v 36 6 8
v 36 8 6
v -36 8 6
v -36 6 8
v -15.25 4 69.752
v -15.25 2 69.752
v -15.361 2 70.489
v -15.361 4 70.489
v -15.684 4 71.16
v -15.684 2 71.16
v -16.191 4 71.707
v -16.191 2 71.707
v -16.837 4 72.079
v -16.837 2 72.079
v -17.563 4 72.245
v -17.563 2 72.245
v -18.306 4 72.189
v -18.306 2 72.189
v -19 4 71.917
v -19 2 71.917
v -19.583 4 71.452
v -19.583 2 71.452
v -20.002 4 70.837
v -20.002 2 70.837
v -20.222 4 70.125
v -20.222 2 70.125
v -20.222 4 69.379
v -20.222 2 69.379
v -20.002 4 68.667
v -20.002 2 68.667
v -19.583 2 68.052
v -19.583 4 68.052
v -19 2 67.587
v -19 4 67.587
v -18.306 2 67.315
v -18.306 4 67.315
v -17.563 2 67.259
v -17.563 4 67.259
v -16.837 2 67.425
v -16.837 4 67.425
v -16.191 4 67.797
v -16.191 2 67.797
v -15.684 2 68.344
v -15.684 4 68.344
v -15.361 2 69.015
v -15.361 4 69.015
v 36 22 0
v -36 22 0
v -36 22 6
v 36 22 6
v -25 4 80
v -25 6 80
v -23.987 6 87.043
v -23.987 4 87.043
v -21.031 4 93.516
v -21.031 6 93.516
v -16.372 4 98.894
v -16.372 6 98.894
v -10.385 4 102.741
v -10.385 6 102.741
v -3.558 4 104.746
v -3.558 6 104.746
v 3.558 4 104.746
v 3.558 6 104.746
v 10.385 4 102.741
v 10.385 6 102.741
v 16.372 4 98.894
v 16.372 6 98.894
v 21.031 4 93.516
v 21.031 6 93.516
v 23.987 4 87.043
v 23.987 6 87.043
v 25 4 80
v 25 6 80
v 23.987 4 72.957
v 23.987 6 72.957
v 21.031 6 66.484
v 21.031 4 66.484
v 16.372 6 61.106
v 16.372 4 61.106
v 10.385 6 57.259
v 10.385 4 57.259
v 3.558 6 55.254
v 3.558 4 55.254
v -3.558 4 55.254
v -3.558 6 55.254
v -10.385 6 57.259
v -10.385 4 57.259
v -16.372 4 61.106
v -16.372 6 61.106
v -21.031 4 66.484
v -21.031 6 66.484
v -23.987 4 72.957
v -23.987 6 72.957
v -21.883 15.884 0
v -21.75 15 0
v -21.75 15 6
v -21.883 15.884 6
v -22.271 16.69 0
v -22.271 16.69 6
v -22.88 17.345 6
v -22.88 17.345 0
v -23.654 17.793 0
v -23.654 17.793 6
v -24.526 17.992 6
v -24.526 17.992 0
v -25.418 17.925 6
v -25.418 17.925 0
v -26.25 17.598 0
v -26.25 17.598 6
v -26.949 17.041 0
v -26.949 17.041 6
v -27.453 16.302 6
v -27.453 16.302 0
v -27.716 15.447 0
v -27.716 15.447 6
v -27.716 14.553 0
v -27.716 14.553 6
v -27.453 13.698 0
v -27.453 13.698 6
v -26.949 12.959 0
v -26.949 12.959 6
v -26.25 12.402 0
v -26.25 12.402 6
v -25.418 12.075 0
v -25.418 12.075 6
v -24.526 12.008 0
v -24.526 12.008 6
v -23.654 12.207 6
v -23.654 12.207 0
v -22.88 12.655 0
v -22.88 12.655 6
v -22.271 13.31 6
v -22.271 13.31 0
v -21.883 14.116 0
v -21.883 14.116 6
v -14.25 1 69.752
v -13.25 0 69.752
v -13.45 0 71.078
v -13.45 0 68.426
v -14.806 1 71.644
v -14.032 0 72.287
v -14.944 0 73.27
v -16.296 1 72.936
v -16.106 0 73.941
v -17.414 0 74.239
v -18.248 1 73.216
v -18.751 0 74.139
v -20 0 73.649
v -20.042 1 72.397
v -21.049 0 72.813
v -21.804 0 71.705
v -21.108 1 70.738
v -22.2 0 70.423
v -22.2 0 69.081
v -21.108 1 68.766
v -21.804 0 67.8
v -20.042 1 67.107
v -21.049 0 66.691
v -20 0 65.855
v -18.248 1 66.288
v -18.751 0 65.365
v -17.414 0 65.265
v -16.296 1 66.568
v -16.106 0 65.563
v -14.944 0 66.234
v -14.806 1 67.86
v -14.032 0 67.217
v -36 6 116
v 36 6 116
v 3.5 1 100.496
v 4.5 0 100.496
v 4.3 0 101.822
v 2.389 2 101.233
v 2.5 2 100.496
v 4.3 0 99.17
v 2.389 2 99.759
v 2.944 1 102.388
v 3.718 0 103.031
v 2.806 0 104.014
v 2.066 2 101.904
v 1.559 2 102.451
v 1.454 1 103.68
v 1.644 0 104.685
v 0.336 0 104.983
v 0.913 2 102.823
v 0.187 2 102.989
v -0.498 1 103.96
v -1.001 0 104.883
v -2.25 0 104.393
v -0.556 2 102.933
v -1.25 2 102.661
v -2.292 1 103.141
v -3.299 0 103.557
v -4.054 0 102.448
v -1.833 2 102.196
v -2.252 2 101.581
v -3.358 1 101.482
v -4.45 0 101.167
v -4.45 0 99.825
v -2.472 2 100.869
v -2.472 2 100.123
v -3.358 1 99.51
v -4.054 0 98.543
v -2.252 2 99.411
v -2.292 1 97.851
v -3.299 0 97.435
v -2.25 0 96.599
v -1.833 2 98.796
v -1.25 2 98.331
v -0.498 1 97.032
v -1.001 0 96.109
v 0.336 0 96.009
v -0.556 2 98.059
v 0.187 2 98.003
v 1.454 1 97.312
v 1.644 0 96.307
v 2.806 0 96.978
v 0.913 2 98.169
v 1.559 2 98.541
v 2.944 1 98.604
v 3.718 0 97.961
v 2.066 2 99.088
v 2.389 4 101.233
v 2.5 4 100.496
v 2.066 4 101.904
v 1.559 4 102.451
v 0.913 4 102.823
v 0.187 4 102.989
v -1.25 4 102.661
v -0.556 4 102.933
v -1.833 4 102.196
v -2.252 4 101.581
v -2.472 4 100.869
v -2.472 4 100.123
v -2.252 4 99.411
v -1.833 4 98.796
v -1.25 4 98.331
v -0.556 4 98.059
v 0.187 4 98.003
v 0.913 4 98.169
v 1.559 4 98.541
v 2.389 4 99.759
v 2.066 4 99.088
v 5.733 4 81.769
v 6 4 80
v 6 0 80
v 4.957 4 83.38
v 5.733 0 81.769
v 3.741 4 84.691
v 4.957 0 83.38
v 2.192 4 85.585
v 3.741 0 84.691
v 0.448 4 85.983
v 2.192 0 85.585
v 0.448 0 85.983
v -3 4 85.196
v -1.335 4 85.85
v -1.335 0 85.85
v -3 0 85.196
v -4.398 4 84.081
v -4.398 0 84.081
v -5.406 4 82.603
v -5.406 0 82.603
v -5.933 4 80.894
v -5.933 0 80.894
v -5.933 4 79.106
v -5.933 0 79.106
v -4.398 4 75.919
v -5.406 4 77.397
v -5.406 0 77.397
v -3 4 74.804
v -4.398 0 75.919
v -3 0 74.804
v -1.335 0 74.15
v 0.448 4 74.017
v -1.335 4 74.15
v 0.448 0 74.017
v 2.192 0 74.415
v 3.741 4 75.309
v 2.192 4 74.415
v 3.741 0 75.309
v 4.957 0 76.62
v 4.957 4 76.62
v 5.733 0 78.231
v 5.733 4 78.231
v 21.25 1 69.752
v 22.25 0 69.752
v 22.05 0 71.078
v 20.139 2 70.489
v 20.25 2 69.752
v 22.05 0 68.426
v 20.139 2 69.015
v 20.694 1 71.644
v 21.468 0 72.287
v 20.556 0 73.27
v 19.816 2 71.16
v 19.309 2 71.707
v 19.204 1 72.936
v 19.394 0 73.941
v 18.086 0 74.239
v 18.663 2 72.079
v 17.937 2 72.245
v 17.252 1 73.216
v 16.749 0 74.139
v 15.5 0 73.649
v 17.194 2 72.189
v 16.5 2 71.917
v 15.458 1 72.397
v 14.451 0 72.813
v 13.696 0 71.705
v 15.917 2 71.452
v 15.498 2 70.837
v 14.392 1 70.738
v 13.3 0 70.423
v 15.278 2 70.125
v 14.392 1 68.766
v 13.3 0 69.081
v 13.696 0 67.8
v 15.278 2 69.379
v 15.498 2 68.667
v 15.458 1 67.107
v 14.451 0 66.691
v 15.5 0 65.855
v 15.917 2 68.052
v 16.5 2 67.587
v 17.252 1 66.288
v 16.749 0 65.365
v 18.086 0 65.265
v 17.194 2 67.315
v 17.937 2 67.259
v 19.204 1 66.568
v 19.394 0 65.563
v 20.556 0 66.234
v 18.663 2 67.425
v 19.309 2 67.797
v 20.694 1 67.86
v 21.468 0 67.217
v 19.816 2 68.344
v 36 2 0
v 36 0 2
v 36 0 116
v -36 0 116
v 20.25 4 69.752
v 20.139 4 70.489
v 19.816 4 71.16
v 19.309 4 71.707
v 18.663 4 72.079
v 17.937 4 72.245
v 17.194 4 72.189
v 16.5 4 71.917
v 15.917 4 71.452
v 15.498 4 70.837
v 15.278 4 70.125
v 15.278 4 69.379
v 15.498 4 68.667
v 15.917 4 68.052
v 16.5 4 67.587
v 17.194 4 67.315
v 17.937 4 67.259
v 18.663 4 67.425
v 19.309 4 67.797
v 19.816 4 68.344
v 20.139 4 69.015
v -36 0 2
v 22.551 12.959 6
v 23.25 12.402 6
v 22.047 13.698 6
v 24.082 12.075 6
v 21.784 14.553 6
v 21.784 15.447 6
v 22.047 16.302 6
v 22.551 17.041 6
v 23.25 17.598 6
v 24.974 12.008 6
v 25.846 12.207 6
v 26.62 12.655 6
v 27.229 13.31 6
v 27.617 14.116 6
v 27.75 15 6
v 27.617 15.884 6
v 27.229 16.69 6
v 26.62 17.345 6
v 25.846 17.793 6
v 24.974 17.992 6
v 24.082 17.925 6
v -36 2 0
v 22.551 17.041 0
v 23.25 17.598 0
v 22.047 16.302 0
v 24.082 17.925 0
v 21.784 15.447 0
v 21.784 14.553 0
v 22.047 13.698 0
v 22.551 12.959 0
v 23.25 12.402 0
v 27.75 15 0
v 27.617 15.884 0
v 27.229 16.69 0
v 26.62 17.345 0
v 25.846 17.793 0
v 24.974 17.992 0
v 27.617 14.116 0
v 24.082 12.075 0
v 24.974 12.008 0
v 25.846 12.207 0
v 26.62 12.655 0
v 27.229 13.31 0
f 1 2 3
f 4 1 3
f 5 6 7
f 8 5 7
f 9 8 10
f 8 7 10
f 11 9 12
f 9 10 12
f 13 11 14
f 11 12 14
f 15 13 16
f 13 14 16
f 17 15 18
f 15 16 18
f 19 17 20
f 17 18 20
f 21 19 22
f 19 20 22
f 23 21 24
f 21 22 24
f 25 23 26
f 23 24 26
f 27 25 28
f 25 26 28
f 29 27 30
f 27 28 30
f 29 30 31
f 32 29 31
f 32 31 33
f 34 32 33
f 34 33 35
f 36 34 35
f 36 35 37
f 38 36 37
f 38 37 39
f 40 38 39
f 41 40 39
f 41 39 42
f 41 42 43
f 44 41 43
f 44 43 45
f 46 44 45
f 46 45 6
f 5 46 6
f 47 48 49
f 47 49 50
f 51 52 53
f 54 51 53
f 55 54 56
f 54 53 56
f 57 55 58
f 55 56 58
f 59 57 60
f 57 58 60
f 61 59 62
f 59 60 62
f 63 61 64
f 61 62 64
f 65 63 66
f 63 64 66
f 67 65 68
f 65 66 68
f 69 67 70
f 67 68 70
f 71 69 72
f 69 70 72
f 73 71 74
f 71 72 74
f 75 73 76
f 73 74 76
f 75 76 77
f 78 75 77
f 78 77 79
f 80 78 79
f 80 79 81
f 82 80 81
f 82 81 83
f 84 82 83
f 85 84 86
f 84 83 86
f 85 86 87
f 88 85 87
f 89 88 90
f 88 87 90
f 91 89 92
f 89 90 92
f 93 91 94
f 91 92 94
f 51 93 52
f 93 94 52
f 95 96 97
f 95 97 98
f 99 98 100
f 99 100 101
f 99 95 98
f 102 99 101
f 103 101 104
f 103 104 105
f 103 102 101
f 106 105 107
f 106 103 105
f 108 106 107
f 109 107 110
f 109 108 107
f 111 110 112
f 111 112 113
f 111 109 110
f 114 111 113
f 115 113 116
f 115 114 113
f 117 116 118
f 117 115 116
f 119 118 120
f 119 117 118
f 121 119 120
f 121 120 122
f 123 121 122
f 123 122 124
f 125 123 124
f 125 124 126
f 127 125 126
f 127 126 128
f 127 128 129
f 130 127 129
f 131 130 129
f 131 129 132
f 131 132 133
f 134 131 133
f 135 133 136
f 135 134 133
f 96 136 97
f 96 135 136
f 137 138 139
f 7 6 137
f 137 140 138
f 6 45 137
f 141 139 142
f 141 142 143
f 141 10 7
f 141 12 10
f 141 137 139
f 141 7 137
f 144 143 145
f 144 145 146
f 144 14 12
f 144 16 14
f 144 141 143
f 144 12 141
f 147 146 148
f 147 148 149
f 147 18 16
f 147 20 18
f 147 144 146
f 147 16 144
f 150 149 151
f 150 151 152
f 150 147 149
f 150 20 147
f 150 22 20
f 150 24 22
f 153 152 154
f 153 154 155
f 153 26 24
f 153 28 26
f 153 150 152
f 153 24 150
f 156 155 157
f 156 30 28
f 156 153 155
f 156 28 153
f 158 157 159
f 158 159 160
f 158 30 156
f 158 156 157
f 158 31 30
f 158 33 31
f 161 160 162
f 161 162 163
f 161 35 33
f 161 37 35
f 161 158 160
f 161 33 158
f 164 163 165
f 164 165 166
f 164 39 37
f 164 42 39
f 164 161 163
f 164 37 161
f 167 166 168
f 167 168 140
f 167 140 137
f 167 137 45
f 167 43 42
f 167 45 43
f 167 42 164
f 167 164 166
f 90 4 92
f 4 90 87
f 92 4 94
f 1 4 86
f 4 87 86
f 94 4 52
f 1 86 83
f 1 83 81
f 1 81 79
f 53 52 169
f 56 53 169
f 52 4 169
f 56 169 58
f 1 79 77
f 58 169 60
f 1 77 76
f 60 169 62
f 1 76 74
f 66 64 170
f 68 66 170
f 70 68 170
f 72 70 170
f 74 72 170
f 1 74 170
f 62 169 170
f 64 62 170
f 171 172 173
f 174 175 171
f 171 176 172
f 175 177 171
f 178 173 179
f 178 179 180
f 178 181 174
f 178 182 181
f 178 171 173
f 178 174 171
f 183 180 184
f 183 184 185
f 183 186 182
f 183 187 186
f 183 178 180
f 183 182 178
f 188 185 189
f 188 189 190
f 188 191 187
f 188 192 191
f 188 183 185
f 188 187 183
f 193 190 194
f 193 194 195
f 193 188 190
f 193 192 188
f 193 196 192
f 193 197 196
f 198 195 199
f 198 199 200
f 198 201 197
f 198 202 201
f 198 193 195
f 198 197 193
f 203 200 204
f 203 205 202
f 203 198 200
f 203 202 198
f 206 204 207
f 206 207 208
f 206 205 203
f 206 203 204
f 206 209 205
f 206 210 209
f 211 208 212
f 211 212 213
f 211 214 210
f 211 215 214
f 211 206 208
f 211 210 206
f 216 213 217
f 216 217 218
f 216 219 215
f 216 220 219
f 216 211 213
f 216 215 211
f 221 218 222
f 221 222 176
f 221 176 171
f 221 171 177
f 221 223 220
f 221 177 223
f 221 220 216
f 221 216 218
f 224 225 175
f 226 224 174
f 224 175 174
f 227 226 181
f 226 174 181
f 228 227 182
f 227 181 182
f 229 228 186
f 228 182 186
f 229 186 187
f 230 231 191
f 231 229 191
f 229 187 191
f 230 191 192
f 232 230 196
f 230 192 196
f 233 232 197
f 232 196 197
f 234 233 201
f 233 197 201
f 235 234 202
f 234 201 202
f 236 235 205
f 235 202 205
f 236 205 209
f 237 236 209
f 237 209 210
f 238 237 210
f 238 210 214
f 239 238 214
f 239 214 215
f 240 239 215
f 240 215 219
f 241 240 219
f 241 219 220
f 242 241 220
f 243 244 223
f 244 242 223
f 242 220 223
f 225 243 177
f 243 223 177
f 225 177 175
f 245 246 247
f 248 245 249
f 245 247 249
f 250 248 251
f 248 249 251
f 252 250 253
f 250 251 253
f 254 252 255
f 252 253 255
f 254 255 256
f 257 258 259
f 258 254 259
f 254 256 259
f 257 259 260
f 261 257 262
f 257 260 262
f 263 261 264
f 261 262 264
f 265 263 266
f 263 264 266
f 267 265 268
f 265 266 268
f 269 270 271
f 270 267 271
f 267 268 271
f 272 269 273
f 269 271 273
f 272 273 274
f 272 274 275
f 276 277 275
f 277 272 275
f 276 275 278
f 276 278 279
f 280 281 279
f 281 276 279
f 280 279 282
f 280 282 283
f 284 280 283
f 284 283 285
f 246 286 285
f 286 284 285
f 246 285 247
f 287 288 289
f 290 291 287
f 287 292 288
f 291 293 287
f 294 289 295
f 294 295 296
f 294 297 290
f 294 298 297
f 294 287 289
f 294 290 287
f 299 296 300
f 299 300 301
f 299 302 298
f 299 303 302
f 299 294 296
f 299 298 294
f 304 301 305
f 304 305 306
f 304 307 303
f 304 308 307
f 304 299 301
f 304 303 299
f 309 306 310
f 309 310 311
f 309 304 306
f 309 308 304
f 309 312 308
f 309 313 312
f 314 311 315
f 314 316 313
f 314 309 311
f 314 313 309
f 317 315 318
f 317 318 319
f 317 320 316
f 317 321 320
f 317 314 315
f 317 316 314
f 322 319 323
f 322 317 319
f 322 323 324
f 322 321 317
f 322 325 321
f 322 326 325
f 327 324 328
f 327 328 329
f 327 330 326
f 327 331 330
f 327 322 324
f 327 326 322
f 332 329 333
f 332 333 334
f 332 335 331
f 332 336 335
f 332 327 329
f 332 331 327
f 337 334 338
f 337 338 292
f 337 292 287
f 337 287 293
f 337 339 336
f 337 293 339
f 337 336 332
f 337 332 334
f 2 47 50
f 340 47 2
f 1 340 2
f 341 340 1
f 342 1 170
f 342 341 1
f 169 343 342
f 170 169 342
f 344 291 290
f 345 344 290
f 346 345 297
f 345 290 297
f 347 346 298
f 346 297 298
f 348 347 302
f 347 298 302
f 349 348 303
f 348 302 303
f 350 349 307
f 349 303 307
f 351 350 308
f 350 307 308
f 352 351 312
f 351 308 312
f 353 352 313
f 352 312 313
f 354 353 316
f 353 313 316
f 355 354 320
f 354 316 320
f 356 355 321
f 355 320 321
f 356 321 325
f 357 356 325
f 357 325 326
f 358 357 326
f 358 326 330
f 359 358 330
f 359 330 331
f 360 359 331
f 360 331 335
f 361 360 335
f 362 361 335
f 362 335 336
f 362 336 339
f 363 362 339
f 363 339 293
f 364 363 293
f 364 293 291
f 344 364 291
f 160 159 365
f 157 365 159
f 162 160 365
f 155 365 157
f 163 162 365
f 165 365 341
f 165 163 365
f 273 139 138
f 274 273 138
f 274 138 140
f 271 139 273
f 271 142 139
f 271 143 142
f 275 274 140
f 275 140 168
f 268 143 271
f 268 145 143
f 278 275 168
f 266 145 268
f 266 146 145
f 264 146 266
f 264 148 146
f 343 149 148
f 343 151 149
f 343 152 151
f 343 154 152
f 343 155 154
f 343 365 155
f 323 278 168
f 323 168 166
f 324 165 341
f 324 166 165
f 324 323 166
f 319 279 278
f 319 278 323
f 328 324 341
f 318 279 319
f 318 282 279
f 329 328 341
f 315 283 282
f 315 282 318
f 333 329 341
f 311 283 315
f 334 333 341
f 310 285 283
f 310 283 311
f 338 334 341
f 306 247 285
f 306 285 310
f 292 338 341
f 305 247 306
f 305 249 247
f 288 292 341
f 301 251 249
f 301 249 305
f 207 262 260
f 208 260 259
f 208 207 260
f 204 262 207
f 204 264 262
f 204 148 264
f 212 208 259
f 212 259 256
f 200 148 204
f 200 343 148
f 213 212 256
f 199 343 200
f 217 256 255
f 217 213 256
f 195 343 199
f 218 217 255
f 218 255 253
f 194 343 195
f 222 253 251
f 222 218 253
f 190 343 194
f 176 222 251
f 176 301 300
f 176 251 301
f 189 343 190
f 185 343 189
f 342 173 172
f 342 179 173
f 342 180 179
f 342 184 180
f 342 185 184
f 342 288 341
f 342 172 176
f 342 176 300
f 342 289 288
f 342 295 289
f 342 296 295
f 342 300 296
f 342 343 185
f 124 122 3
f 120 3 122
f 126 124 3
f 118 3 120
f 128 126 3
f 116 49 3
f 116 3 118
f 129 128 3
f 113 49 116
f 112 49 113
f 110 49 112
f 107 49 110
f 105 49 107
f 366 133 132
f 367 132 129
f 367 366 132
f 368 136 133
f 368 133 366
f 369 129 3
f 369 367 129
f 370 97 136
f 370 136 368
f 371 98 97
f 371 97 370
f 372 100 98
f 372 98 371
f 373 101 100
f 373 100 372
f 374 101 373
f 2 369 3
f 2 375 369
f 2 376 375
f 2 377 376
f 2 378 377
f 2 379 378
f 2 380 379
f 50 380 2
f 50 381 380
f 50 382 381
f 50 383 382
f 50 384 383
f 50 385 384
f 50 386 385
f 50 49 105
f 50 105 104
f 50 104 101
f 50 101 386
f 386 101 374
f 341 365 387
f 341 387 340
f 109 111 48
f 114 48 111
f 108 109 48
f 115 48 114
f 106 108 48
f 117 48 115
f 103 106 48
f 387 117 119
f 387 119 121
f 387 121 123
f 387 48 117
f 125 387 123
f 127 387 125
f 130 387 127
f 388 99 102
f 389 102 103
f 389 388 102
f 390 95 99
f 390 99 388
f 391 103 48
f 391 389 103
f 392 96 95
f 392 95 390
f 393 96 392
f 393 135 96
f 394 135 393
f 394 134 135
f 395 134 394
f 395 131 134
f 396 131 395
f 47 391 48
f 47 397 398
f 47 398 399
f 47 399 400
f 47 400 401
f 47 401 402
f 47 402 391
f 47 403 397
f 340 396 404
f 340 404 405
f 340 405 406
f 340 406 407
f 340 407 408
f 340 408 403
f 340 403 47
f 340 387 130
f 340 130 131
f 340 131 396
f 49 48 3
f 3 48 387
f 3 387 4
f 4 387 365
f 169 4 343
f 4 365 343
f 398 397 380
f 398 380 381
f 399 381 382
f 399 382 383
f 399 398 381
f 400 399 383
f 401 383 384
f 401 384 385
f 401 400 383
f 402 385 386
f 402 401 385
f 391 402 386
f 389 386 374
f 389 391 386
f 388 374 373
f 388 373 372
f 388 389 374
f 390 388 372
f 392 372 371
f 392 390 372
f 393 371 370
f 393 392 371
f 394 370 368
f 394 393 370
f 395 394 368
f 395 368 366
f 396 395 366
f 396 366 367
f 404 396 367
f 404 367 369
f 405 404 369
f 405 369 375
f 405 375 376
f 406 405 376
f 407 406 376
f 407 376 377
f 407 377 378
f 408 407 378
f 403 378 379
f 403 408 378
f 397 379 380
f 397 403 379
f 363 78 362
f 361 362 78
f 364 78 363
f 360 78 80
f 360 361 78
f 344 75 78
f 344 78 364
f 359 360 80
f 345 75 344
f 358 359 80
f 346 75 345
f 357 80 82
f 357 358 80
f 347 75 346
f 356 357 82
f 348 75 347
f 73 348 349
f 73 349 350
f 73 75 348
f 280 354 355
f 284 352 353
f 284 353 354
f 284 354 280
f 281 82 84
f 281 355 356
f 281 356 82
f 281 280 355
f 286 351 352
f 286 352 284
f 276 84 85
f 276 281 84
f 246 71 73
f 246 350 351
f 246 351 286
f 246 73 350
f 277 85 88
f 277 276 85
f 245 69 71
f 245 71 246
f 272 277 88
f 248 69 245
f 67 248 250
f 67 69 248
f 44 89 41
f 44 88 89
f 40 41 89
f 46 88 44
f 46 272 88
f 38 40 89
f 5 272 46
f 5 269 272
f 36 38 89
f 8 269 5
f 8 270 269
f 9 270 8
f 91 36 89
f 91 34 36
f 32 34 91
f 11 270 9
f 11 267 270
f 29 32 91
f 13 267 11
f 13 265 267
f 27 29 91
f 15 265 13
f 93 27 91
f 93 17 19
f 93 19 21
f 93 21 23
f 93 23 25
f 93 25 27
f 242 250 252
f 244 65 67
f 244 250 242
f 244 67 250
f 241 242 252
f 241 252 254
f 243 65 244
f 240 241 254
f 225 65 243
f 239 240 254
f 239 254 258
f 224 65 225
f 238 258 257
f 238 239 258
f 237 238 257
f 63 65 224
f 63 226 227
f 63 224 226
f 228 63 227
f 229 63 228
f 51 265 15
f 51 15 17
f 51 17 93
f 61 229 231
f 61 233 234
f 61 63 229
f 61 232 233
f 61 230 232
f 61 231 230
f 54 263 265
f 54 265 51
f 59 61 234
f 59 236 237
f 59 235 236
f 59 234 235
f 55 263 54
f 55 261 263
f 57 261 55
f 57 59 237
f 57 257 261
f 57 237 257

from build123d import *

# Parameters (mm, degrees)
F0_W     = 72
F0_H     = 116
F0_R     = 2.5
F0_R_2   = 6
F2_DEPTH = 6
F1_W     = 72
F1_H     = 22
F1_R     = 3
F3_DEPTH = 6
F4_SIZE  = 2
F5_SIZE  = 2
F6_SIZE  = 2
F7_R     = 25
F7_R_2   = 2.5
F7_R_3   = 6
F8_DEPTH = 2


with BuildPart() as f2:
    # F0 (on Front) → F2 (new body)
    with BuildSketch(Plane.XZ):
        with Locations((0, 58)):
            Rectangle(F0_W, F0_H)
        with Locations((-17.75, 69.752033)):
            Circle(F0_R, mode=Mode.SUBTRACT)
        with Locations((17.75, 69.752033)):
            Circle(F0_R, mode=Mode.SUBTRACT)
        with Locations((0, 80)):
            Circle(F0_R_2, mode=Mode.SUBTRACT)
        with Locations((0, 100.495935)):
            Circle(F0_R, mode=Mode.SUBTRACT)
    extrude(amount=-F2_DEPTH)

    # F1 (on Top) → F3 (join)
    with BuildSketch(Plane.XY):
        with Locations((0, 11)):
            Rectangle(F1_W, F1_H)
        with Locations((-24.75, 15)):
            Circle(F1_R, mode=Mode.SUBTRACT)
        with Locations((24.75, 15)):
            Circle(F1_R, mode=Mode.SUBTRACT)
    extrude(amount=F3_DEPTH)

    # F4
    f4_edges = [f2.edges().sort_by_distance(p)[0] for p in [
        (0, 6, 6),
    ]]
    chamfer(f4_edges, length=F4_SIZE)

    # F5
    f5_edges = [f2.edges().sort_by_distance(p)[0] for p in [
        (0, 0, 0),
    ]]
    chamfer(f5_edges, length=F5_SIZE)

    # F6
    f6_edges = [f2.edges().sort_by_distance(p)[0] for p in [
        (-2.5, 0, 100.495935),
        (-20.25, 0, 69.752033),
        (15.25, 0, 69.752033),
    ]]
    chamfer(f6_edges, length=F6_SIZE)

    # F7 (on face) → F8 (cut)
    with BuildSketch(Plane(origin=(0, 6, 0), x_dir=(-1, 0, 0), z_dir=(0, 1, 0))):
        with Locations((0, 80)):
            Circle(F7_R)
        with Locations((-17.75, 69.752033)):
            Circle(F7_R_2, mode=Mode.SUBTRACT)
        with Locations((17.75, 69.752033)):
            Circle(F7_R_2, mode=Mode.SUBTRACT)
        with Locations((0, 80)):
            Circle(F7_R_3, mode=Mode.SUBTRACT)
        with Locations((0, 100.495935)):
            Circle(F7_R_2, mode=Mode.SUBTRACT)
    extrude(amount=-F8_DEPTH, mode=Mode.SUBTRACT)


solid = f2.part
